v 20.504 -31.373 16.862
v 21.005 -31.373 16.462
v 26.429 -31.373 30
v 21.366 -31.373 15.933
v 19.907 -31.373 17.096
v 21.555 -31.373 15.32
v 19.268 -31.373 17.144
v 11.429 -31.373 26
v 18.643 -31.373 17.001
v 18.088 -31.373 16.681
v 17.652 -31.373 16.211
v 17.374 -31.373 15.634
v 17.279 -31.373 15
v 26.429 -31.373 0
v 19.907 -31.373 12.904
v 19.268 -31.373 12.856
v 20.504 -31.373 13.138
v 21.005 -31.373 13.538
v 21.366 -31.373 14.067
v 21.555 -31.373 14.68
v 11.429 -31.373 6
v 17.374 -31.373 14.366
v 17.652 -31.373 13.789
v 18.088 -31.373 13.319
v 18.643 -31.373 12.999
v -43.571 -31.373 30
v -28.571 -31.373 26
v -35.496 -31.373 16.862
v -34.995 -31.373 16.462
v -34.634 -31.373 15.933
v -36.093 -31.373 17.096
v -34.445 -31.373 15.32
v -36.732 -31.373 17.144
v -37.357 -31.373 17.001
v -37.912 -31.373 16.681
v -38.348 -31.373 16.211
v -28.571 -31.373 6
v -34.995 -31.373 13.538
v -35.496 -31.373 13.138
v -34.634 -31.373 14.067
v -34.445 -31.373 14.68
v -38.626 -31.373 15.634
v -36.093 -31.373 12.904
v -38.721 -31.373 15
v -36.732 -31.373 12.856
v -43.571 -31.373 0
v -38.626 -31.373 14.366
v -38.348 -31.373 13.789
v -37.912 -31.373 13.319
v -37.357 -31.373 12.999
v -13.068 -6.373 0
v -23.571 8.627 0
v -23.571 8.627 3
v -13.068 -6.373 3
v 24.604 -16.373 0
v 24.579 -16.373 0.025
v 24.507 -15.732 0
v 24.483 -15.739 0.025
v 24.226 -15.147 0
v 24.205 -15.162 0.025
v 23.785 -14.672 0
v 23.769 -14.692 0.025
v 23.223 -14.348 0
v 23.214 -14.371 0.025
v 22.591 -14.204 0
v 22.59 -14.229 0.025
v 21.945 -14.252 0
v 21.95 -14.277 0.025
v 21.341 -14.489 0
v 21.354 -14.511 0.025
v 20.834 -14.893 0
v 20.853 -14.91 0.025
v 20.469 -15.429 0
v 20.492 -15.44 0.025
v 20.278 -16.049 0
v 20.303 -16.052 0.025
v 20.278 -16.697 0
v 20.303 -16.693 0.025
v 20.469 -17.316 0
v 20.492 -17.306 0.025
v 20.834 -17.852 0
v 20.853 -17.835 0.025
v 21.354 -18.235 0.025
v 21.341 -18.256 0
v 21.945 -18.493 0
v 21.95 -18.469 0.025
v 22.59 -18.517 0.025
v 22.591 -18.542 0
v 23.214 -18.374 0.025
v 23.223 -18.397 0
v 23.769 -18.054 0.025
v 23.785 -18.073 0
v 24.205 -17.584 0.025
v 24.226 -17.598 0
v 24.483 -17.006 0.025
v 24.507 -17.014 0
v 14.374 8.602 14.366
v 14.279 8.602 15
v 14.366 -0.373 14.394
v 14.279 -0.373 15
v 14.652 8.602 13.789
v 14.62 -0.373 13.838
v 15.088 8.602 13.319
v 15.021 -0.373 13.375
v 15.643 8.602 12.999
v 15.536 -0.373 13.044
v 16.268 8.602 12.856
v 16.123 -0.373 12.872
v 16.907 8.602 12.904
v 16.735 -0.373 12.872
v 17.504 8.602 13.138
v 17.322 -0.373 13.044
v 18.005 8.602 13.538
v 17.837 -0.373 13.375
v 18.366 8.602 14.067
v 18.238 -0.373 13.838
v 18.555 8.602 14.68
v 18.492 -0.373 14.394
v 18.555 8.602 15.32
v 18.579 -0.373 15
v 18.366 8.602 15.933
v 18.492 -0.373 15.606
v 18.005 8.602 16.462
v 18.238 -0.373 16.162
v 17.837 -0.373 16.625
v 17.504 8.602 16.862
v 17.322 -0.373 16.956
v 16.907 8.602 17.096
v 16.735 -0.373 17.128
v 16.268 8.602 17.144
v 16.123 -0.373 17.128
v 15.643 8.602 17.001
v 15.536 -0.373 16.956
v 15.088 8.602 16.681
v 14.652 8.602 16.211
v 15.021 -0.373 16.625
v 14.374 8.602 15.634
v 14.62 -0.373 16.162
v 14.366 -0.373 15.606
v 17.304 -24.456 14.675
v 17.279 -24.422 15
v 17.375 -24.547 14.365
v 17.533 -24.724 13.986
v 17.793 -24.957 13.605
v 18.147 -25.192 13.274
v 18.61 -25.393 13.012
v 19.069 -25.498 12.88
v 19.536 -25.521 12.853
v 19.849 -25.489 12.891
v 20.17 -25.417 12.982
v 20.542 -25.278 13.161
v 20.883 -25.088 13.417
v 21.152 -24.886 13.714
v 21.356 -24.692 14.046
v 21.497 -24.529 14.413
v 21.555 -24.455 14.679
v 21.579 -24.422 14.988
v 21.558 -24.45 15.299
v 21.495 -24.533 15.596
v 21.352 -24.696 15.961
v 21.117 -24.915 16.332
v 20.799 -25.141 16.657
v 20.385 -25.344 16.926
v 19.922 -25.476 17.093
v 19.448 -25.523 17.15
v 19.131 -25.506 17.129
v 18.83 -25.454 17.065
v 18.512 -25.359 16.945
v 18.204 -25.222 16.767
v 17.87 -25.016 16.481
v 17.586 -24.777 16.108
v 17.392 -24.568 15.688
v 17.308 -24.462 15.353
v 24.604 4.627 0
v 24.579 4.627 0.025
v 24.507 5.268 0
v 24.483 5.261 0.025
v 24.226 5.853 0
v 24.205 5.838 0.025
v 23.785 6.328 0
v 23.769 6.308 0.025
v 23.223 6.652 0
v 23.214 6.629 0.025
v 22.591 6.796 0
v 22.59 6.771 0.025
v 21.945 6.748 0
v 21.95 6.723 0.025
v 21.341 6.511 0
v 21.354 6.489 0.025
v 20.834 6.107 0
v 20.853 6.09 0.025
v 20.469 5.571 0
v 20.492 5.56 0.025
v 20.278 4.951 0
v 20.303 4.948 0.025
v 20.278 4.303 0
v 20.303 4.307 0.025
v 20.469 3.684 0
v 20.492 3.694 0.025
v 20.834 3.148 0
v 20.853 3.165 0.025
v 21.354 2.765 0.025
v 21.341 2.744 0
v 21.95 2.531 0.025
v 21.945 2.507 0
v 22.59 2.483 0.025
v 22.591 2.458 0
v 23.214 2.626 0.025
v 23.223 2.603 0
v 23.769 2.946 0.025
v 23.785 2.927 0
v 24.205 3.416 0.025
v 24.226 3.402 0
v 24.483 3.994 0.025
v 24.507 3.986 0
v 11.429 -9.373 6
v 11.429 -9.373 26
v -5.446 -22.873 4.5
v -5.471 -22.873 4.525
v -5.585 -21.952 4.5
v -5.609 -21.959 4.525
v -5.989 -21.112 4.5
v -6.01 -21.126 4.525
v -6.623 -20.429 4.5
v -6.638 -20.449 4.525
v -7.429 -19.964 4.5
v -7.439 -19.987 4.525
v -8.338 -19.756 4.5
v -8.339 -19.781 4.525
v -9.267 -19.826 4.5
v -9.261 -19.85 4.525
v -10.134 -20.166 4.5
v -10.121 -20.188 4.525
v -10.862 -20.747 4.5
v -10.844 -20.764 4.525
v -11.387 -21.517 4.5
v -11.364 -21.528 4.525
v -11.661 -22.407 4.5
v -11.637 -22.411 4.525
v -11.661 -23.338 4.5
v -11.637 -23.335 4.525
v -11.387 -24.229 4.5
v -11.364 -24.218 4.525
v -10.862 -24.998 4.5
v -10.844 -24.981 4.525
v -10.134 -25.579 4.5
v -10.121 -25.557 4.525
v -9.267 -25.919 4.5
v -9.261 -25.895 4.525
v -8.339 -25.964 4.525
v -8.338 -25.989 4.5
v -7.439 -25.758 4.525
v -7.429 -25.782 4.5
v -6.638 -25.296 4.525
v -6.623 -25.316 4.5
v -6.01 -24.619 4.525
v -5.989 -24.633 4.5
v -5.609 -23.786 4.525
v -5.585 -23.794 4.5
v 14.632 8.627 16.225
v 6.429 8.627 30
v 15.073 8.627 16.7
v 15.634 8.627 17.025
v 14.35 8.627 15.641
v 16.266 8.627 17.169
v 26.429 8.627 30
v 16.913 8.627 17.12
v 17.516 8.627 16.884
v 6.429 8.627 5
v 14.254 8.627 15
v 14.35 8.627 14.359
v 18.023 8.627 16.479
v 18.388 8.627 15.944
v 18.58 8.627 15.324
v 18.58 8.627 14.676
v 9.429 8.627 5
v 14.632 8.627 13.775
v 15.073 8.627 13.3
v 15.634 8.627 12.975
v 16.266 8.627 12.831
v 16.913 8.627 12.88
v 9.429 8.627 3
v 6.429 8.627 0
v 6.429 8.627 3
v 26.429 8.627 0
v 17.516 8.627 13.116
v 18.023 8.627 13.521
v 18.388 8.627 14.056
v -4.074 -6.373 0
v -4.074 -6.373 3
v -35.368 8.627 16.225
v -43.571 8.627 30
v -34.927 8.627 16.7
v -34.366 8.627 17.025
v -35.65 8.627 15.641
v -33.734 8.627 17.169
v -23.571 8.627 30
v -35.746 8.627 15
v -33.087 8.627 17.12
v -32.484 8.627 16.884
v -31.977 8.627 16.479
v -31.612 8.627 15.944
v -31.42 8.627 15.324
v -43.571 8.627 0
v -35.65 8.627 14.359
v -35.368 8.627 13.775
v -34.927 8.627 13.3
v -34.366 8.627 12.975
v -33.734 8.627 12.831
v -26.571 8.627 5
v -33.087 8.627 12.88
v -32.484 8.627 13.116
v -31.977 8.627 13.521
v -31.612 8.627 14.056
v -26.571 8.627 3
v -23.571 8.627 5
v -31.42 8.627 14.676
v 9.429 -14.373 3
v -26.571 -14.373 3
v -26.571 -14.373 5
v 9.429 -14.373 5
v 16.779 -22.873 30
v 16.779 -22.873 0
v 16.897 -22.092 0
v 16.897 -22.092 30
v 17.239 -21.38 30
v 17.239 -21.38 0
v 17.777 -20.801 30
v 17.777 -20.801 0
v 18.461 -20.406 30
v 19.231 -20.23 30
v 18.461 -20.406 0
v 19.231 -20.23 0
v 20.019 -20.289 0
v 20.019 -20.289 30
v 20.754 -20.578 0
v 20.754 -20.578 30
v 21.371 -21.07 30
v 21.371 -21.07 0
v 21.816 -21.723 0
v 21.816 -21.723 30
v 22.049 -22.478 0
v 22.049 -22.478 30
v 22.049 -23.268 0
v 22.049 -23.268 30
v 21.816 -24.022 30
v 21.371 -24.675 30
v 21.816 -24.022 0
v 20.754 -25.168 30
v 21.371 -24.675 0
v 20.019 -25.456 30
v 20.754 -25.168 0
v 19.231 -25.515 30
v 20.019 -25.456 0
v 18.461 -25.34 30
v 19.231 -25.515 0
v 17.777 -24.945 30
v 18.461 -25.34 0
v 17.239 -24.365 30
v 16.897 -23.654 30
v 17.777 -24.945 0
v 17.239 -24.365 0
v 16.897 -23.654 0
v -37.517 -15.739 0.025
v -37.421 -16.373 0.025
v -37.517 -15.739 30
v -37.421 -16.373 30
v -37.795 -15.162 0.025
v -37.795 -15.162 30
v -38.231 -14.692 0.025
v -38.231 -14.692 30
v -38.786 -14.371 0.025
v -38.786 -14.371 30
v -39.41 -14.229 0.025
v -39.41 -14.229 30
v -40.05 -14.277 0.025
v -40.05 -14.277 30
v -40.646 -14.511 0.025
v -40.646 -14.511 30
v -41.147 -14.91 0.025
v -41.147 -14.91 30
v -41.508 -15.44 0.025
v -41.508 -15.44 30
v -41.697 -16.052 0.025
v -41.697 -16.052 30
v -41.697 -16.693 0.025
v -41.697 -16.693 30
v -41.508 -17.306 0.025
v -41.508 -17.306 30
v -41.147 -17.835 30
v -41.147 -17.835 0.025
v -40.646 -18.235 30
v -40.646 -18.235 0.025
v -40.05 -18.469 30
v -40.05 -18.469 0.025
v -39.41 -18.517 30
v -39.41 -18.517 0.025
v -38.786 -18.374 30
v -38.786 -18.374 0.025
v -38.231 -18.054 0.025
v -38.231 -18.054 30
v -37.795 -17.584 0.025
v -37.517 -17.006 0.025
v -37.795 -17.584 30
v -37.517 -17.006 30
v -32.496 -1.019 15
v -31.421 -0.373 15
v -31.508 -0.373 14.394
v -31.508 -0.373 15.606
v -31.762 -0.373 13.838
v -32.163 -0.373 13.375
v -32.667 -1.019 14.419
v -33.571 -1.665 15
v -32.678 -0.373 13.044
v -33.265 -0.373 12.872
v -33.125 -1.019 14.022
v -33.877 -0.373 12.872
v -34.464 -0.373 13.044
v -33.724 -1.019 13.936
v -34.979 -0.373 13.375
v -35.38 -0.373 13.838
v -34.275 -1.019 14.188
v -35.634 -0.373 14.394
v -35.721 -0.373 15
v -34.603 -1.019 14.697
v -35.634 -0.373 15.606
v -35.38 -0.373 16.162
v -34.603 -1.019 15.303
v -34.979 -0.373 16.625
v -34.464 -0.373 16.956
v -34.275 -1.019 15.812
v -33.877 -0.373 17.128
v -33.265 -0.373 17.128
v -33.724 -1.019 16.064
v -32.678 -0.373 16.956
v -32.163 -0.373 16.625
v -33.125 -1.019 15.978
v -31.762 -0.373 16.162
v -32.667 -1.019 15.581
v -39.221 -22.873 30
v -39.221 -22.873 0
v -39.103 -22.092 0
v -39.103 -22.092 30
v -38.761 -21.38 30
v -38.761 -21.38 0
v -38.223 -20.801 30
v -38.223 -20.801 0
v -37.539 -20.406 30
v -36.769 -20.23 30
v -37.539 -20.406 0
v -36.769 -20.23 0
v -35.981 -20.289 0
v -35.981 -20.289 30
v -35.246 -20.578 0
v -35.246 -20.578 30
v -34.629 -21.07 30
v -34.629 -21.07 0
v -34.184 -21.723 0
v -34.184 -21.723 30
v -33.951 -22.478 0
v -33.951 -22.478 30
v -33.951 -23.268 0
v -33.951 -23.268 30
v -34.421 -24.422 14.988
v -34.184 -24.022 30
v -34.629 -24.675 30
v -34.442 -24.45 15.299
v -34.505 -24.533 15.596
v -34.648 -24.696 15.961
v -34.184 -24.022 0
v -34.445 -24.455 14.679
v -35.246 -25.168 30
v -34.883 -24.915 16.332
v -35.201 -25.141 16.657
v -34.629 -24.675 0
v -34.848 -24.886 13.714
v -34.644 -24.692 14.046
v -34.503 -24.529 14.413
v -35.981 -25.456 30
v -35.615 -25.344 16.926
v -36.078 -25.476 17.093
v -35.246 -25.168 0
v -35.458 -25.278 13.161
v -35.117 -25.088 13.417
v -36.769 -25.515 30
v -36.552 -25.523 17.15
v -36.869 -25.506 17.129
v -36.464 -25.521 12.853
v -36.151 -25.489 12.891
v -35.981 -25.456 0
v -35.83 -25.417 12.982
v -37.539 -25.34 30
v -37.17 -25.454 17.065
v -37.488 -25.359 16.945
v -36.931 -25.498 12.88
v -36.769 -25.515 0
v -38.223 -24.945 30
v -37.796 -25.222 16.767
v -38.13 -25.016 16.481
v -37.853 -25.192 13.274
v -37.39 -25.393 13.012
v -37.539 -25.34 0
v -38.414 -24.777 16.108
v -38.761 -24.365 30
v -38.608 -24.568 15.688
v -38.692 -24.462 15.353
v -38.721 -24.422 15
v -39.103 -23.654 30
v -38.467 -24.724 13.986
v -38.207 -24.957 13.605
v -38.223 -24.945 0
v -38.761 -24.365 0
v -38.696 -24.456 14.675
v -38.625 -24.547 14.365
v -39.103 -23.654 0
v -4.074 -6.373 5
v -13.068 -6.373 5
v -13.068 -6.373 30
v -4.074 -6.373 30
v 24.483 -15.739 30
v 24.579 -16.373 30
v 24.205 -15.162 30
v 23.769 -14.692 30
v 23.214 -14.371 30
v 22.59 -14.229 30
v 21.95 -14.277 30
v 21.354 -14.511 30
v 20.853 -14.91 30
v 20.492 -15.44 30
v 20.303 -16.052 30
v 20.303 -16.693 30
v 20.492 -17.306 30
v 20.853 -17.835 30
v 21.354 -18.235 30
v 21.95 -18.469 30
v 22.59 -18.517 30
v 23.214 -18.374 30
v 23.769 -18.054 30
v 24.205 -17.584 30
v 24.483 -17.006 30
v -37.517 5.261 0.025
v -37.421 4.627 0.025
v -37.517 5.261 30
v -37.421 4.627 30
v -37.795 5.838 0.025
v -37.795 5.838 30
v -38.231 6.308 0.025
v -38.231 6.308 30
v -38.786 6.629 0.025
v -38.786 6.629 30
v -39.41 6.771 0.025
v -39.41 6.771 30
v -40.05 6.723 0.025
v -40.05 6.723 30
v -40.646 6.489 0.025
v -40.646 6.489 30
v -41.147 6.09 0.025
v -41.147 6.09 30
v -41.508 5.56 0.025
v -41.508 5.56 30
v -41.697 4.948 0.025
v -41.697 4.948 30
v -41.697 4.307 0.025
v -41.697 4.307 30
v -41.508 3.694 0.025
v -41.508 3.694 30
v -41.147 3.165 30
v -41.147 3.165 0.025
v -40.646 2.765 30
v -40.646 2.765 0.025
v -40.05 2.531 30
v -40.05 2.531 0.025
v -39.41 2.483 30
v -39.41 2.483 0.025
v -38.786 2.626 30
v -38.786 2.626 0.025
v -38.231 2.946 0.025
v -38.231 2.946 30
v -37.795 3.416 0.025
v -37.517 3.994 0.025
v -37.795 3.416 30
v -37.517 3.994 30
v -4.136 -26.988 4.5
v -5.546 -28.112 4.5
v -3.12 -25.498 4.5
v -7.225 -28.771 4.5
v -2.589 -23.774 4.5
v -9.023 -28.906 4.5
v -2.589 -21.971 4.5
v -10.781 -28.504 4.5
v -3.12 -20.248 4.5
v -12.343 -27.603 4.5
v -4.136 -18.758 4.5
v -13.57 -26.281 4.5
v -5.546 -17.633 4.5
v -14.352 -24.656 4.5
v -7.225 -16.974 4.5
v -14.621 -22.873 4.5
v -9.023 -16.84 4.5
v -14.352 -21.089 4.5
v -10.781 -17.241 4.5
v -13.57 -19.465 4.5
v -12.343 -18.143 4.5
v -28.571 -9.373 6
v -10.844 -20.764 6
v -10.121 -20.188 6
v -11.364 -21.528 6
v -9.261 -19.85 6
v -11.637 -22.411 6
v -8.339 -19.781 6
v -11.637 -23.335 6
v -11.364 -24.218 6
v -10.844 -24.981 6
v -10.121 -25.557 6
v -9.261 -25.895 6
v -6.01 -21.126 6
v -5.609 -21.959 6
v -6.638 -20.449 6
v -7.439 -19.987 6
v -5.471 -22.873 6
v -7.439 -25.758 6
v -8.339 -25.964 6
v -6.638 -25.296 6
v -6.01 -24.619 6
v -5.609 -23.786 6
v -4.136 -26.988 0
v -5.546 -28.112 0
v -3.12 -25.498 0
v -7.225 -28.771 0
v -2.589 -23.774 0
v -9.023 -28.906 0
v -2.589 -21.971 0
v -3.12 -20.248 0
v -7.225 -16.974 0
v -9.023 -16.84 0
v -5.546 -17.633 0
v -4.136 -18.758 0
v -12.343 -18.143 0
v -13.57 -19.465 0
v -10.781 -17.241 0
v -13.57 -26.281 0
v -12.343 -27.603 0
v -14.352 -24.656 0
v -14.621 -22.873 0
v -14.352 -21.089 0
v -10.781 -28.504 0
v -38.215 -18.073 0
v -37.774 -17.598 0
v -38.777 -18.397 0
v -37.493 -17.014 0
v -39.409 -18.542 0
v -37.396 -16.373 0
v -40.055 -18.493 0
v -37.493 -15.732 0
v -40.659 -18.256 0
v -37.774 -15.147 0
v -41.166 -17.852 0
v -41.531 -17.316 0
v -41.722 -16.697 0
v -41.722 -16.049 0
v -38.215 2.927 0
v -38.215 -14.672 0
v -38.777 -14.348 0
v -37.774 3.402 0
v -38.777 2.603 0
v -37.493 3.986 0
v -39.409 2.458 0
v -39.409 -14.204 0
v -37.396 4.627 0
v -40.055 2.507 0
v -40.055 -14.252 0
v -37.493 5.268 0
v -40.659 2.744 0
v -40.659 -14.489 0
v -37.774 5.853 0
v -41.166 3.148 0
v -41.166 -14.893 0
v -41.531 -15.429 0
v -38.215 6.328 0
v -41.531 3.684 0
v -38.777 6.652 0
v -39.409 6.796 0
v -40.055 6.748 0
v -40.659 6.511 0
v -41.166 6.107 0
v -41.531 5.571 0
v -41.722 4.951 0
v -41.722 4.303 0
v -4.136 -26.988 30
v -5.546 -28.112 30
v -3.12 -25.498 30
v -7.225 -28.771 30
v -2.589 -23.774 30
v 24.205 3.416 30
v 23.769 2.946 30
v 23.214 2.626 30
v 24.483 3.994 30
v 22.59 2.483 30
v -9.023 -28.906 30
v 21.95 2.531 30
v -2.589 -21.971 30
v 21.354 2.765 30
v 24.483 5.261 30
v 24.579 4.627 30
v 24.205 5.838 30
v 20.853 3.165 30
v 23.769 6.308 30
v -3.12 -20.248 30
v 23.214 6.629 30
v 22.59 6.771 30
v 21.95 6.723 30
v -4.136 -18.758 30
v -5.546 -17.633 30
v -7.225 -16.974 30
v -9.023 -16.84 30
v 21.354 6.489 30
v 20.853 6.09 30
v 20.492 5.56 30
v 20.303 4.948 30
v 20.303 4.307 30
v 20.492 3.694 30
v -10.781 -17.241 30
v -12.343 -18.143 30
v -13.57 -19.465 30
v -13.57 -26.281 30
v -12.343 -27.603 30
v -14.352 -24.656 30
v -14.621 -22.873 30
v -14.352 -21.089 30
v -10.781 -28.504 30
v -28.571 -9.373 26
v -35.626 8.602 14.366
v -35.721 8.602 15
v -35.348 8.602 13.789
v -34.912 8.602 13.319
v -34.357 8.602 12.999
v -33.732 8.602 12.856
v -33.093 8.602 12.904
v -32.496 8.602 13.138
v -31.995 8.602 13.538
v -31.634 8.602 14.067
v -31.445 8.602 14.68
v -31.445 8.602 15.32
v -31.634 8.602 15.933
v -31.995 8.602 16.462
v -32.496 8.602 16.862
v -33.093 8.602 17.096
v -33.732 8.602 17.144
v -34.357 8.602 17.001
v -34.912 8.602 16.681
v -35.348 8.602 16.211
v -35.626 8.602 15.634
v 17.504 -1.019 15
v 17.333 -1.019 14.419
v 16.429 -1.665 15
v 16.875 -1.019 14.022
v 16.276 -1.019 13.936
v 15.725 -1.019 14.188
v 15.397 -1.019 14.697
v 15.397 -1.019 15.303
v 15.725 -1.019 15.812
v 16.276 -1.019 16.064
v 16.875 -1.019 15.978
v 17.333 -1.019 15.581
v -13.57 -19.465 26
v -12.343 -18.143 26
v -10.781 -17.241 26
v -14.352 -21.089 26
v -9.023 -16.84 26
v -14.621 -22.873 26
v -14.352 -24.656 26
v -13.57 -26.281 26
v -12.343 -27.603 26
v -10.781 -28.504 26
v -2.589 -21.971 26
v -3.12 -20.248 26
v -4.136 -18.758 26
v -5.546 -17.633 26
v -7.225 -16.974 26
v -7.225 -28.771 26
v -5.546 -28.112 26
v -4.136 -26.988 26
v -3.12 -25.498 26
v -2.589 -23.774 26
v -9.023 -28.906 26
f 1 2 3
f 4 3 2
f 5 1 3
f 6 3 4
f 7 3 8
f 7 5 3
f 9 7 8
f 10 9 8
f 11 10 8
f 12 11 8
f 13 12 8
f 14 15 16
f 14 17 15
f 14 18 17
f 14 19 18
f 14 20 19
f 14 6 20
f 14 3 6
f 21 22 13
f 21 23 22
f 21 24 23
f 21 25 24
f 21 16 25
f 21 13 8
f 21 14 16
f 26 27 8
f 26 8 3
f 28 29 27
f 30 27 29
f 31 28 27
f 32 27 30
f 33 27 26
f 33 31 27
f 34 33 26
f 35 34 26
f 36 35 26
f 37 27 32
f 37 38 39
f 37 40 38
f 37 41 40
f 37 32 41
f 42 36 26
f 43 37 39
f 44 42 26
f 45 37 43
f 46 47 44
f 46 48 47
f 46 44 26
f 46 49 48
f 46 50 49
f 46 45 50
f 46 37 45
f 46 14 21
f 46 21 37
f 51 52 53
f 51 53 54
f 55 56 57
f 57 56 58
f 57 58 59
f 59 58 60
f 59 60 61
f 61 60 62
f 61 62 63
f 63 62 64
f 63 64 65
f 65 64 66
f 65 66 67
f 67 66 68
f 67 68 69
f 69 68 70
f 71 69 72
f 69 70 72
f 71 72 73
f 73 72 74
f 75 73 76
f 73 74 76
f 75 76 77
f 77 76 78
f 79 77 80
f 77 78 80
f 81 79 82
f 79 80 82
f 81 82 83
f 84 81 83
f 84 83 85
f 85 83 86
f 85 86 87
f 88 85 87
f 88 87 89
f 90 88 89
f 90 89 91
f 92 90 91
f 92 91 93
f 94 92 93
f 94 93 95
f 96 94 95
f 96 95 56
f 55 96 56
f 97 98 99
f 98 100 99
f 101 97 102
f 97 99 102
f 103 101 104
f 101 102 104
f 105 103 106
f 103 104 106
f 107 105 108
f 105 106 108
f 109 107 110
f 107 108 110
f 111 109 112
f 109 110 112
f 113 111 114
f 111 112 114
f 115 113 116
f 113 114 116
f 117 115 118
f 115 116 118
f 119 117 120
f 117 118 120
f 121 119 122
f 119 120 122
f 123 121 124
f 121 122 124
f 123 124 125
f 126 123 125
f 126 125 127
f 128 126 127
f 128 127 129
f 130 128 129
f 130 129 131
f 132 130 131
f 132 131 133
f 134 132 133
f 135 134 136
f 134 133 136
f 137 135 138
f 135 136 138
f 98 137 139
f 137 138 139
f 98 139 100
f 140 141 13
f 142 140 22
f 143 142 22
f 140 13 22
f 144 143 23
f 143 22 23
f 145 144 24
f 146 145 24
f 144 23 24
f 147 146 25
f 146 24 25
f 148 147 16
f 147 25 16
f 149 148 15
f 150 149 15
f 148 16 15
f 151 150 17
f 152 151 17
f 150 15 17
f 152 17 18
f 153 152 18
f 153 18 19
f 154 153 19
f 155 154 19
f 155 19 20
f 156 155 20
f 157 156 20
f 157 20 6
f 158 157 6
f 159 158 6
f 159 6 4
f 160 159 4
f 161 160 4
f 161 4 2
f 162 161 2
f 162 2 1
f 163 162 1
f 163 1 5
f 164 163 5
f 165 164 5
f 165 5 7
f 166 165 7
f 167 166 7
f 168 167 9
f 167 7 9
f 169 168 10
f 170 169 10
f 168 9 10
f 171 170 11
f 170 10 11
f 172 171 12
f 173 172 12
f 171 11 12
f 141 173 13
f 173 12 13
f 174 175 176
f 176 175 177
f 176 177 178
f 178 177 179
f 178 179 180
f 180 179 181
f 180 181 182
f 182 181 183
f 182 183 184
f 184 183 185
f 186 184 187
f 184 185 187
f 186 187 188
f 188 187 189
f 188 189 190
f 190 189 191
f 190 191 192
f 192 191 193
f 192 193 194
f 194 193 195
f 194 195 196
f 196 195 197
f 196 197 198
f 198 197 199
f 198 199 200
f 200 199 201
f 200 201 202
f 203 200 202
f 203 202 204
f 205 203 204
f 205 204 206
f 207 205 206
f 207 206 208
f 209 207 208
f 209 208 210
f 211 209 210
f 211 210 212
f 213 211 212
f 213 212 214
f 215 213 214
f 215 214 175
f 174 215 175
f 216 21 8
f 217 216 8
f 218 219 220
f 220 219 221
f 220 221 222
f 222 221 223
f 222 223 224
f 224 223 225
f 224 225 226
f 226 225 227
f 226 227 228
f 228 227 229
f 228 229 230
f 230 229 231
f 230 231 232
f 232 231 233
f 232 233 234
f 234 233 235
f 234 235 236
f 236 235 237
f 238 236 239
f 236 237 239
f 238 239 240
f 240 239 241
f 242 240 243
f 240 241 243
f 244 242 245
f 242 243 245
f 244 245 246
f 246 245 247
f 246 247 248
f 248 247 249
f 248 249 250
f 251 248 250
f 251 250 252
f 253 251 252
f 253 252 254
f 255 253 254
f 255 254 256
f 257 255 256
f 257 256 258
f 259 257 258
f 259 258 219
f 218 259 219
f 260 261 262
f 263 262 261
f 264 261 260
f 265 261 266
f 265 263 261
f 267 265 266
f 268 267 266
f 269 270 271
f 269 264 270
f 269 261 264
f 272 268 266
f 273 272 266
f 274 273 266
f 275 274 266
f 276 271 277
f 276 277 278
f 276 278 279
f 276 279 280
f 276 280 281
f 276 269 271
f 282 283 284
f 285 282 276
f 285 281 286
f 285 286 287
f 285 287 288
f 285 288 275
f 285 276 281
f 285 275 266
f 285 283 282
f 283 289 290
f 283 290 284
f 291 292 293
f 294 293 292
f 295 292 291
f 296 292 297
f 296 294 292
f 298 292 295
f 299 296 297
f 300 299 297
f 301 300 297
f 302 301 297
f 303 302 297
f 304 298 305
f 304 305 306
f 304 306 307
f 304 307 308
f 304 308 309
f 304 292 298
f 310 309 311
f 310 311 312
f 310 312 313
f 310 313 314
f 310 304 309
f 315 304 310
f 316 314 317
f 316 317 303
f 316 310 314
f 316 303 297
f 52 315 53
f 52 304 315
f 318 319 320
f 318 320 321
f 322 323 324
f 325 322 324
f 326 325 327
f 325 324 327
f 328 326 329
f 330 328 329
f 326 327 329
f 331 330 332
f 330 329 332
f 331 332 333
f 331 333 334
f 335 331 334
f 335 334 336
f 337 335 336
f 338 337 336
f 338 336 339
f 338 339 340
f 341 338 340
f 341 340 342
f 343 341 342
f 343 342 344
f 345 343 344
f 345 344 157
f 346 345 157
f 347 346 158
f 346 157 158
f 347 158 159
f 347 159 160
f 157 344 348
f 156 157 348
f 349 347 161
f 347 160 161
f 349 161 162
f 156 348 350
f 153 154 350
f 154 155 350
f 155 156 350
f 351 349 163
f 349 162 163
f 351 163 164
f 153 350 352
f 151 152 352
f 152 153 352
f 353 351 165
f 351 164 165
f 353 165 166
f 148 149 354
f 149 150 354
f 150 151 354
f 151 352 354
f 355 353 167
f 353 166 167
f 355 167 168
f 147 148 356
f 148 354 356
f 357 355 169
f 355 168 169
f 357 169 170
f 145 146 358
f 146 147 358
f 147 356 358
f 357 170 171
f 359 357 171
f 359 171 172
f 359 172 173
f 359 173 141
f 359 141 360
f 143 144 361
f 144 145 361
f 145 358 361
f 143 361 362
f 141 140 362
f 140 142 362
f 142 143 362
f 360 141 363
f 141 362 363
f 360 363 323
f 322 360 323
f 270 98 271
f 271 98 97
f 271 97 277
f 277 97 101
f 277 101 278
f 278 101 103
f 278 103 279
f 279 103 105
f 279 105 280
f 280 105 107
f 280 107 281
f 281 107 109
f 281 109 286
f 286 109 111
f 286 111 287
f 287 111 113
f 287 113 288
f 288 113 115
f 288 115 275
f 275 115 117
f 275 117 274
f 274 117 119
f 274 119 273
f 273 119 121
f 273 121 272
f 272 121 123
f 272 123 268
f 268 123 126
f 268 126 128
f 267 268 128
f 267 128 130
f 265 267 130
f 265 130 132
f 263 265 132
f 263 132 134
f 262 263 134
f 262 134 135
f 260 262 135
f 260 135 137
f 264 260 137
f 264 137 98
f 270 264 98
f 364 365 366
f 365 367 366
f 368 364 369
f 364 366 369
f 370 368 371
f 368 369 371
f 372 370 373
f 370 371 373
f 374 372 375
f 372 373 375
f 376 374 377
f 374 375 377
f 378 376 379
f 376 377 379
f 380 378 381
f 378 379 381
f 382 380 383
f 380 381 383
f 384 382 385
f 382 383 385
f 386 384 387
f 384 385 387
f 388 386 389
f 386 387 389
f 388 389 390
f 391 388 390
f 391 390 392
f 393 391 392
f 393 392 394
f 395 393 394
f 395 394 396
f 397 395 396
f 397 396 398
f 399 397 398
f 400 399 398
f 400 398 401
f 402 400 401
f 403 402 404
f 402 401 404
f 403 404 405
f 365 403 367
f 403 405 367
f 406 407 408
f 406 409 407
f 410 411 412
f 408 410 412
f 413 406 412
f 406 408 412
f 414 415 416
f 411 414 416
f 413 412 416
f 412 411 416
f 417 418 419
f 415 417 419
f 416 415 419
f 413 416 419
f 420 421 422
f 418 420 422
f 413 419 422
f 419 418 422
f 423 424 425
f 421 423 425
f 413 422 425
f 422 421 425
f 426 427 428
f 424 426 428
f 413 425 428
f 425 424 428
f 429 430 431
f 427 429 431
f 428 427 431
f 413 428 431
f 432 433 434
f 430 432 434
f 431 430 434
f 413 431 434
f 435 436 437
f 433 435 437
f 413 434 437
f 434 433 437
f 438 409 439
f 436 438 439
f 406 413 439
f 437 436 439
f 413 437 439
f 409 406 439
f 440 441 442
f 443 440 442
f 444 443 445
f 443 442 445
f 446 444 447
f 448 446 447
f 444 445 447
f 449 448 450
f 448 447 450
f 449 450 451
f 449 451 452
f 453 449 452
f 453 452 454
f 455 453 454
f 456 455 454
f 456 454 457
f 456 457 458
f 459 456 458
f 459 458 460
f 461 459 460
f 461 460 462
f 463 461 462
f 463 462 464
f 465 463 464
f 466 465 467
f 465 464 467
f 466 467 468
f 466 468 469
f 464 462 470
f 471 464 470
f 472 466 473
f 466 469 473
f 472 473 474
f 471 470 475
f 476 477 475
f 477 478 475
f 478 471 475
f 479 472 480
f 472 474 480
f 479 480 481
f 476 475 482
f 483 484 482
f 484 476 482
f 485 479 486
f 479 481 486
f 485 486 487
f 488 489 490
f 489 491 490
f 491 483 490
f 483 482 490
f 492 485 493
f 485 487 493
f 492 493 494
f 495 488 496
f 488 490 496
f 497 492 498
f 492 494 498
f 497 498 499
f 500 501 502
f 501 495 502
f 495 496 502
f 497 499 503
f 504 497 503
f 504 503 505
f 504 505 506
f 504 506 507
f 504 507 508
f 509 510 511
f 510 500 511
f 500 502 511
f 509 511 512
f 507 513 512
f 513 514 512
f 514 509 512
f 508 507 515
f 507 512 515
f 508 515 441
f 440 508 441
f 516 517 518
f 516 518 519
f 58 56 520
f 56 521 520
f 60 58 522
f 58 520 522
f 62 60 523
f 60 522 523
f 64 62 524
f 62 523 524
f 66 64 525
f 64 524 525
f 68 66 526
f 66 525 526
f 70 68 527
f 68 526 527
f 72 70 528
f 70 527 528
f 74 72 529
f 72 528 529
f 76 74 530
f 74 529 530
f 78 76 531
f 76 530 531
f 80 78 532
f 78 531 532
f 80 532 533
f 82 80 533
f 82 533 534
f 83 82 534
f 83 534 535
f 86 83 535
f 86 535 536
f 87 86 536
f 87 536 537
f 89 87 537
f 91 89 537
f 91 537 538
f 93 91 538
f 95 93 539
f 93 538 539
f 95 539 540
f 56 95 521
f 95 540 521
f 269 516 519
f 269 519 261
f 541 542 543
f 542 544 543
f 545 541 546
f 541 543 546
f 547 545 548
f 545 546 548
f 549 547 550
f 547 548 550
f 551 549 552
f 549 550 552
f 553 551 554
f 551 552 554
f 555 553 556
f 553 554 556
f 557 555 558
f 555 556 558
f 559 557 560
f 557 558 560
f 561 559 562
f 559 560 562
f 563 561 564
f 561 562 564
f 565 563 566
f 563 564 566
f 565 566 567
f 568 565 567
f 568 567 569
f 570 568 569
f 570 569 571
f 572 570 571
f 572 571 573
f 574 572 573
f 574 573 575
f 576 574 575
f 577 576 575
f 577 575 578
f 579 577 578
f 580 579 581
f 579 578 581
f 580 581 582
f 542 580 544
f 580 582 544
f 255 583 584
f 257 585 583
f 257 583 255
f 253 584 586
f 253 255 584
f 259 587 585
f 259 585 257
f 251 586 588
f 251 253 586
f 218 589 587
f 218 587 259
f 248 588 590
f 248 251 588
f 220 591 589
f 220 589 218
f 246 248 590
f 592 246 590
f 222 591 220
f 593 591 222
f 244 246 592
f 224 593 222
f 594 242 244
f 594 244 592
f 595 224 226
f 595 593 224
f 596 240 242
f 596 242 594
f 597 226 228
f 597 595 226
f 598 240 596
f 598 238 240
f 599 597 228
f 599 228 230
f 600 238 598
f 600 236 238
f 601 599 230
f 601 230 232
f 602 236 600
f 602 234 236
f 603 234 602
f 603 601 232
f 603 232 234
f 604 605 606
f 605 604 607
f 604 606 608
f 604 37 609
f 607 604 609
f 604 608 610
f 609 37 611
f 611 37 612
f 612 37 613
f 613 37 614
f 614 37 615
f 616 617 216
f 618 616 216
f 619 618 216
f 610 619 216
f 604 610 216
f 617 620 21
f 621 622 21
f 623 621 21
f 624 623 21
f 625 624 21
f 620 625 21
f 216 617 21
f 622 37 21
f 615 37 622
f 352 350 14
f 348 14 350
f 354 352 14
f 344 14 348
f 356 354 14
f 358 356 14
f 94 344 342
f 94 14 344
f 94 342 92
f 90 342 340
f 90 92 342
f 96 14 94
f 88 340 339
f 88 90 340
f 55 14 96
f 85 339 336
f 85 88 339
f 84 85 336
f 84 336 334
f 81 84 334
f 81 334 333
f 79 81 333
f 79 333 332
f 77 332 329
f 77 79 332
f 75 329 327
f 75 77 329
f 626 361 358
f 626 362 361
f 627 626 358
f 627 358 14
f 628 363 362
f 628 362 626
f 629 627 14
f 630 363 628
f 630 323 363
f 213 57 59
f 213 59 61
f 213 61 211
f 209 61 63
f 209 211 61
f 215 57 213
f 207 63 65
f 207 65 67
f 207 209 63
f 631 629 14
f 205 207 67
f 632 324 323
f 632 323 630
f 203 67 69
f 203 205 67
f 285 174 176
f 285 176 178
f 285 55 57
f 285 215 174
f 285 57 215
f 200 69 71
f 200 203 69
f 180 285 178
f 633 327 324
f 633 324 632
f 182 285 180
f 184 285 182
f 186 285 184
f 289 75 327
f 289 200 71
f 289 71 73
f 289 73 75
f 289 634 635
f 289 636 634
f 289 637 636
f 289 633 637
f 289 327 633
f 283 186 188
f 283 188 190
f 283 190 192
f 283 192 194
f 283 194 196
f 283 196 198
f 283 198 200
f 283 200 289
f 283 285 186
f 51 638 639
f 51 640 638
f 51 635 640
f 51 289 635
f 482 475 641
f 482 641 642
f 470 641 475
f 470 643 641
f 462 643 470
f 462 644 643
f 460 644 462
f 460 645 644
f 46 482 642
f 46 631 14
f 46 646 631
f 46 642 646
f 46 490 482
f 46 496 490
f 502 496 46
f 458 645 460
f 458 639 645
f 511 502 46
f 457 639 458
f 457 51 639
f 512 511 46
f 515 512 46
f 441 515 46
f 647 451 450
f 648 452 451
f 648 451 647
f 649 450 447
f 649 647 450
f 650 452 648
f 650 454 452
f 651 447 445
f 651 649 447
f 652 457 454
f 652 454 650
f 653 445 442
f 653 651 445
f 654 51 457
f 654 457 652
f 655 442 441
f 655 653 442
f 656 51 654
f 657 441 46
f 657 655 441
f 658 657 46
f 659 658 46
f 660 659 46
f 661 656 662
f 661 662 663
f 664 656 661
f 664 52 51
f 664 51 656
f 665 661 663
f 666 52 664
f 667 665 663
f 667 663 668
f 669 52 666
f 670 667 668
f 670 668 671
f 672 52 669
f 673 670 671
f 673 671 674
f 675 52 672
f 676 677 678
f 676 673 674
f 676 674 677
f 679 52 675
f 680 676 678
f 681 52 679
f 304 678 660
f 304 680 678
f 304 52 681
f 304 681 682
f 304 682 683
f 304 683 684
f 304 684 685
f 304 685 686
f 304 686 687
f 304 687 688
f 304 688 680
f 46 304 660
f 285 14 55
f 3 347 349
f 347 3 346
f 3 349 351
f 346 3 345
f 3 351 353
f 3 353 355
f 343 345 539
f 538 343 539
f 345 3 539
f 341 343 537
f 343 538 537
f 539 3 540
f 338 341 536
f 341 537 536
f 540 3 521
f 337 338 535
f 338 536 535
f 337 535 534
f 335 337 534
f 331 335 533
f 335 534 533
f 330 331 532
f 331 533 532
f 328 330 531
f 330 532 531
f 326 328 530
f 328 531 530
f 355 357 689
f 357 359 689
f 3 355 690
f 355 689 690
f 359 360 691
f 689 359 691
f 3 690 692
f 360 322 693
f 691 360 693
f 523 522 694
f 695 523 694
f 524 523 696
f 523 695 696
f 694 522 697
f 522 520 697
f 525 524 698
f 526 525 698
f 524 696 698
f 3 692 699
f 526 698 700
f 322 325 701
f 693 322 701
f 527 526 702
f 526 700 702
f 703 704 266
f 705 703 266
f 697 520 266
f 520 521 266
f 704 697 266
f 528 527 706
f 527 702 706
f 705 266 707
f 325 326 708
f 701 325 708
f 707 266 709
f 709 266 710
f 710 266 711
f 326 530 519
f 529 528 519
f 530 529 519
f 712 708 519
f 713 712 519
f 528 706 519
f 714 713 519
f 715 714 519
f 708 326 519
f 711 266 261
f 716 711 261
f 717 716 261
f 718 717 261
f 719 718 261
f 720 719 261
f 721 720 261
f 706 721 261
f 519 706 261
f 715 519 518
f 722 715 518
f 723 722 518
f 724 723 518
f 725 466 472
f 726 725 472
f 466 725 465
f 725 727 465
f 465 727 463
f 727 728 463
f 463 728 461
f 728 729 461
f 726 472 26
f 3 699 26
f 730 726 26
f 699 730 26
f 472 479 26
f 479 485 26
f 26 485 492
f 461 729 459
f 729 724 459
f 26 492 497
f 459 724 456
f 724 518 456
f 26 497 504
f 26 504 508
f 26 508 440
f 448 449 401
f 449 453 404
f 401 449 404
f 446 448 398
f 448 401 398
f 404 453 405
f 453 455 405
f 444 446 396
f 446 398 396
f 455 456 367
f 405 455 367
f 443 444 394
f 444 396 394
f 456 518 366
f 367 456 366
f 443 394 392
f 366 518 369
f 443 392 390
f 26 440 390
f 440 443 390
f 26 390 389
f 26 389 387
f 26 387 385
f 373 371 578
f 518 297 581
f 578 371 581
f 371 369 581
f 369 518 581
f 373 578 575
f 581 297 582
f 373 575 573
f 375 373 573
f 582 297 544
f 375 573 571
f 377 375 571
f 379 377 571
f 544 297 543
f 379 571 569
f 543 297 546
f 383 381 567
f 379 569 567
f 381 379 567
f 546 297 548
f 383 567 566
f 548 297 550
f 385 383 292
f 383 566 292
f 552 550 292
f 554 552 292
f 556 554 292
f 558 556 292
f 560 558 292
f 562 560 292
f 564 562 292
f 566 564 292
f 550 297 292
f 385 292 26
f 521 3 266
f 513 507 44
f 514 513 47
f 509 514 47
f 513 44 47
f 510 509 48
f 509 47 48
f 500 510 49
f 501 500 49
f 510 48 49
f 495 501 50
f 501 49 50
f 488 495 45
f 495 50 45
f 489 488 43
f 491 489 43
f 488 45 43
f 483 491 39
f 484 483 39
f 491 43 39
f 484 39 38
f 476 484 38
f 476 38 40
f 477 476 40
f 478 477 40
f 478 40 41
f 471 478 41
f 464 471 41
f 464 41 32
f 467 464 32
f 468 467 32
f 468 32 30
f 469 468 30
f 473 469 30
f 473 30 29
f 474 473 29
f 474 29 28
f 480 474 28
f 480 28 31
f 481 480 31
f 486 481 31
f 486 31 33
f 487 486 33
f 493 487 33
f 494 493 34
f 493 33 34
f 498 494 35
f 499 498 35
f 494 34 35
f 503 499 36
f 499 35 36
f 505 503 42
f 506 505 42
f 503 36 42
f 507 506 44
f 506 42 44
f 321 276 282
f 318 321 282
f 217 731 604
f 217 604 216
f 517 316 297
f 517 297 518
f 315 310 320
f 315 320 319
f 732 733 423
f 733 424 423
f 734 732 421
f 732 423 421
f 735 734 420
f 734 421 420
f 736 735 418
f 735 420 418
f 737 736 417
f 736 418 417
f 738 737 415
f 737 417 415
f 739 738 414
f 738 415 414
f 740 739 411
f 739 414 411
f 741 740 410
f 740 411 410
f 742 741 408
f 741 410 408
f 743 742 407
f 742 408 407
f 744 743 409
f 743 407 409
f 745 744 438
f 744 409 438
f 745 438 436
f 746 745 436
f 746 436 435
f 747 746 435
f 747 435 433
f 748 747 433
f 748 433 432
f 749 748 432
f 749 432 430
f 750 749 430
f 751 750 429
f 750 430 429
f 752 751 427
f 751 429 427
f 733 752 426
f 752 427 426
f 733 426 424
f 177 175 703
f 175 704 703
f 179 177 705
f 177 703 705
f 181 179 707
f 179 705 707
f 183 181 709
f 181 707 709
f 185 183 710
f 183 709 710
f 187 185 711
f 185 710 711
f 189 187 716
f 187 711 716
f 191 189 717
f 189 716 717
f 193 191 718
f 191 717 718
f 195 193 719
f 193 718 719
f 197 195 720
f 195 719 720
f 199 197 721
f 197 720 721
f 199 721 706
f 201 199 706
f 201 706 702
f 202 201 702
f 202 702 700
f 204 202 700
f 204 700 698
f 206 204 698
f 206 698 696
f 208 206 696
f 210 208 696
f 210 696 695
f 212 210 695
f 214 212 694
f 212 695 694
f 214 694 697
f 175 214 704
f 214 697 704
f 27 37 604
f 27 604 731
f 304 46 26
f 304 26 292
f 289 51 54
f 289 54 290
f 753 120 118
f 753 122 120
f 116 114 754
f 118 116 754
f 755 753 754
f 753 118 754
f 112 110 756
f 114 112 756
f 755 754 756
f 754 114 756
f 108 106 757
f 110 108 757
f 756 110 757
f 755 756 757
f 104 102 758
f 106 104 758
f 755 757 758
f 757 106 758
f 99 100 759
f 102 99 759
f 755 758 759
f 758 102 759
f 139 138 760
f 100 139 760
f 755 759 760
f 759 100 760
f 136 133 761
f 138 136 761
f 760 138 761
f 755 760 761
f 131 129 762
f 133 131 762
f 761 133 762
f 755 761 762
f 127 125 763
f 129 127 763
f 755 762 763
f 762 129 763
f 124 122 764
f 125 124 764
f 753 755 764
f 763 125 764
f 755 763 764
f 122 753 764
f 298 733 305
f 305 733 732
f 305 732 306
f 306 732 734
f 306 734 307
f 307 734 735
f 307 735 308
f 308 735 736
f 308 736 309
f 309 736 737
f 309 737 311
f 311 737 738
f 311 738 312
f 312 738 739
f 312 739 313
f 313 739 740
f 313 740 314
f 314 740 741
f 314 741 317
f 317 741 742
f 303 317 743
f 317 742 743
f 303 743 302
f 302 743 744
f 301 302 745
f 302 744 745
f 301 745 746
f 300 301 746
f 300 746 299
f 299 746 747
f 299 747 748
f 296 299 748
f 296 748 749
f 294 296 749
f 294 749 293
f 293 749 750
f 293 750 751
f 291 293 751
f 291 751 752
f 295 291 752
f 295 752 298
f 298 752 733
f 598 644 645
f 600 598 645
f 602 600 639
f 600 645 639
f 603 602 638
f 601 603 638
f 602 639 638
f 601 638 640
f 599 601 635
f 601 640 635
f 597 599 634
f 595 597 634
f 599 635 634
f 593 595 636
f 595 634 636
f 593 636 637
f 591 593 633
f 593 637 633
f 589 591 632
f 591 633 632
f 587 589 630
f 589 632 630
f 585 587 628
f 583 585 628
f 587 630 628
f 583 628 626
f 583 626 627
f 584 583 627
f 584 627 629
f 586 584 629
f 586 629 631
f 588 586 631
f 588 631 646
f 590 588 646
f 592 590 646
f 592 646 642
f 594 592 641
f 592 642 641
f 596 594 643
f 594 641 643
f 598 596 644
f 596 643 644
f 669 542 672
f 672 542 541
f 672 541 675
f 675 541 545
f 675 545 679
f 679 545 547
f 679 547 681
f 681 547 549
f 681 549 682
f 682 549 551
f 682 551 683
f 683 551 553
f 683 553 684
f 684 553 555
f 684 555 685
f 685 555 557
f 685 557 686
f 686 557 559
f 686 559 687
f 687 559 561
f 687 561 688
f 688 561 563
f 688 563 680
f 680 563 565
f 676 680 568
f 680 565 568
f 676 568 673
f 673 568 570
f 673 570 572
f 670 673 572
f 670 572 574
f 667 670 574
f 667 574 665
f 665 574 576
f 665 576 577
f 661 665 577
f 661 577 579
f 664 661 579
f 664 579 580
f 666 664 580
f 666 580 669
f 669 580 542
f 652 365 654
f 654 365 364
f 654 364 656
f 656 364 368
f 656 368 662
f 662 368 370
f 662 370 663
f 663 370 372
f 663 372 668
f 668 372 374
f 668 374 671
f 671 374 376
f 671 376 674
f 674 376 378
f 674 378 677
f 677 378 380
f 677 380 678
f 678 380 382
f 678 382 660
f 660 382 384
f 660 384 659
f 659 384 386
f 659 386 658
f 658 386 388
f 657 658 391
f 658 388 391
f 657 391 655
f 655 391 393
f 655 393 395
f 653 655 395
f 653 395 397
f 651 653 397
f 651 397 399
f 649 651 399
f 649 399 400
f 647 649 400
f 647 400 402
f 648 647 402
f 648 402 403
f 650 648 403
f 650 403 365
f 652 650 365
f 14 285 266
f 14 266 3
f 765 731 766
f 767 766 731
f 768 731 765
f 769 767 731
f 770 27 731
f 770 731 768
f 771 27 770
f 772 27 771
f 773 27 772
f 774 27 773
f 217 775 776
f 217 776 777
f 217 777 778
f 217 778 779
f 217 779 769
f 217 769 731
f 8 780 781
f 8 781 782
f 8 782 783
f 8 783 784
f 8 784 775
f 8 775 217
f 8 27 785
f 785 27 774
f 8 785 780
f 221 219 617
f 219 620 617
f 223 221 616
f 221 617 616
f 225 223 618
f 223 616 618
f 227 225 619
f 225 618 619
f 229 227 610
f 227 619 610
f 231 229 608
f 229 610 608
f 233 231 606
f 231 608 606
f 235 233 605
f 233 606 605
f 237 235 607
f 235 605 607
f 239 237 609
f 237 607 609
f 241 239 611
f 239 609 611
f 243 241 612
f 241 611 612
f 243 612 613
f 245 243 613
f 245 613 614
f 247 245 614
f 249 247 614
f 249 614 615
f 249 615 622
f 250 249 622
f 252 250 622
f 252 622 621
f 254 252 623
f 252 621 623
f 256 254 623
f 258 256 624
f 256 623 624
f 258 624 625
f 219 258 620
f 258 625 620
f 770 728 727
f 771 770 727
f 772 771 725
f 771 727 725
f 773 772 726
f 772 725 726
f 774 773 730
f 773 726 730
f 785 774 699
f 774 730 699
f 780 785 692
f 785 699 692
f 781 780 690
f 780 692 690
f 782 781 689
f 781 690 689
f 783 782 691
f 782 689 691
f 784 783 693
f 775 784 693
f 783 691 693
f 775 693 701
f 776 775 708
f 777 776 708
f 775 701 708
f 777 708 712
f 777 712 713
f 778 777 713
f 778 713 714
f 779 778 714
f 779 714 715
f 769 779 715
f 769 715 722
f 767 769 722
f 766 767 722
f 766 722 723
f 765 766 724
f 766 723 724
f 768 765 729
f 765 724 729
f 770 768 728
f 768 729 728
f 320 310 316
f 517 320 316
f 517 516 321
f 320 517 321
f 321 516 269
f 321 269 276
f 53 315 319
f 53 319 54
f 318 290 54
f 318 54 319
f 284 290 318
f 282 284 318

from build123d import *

# Parameters (mm, degrees)
AUFSATZ_LINEAR_AUSTRAGEN1_DEPTH            = 30
DURCHGANGSLOCH_F_R_M51_D                   = 5.3
DURCHGANGSLOCH_F_R_M43_REACH               = 68.321
DURCHGANGSLOCH_F_R_M43_BORE_R              = 2.15
DURCHGANGSLOCH_F_R_M41_D                   = 4.3
DURCHGANGSLOCH_F_R_M41_CSINK_D             = 4.35
DURCHGANGSLOCH_F_R_M41_CSINK_ANGLE         = 90
SKIZZE21_W                                 = 40
SKIZZE21_H                                 = 20
SCHNITT_LINEAR_AUSTRAGEN5_DEPTH            = 22
SKIZZE22_R                                 = 6.05
SCHNITT_LINEAR_AUSTRAGEN6_DEPTH            = 4.5
F_6_2_6_2_DURCHMESSER_BOHRUNG1_D           = 6.2
F_6_2_6_2_DURCHMESSER_BOHRUNG1_CSINK_D     = 6.25
F_6_2_6_2_DURCHMESSER_BOHRUNG1_CSINK_ANGLE = 90
SKIZZE25_R                                 = 6.05
SCHNITT_LINEAR_AUSTRAGEN7_DEPTH            = 4
DURCHGANGSLOCH_F_R_M42_D                   = 4.3
DURCHGANGSLOCH_F_R_M42_DEPTH               = 9
DURCHGANGSLOCH_F_R_M42_CSINK_D             = 4.35
DURCHGANGSLOCH_F_R_M42_CSINK_ANGLE         = 90
DURCHGANGSLOCH_F_R_M42_TIP                 = 1.291850331
SKIZZE30_W                                 = 36
SKIZZE30_H                                 = 2
SCHNITT_LINEAR_AUSTRAGEN8_DEPTH            = 23


with BuildPart() as part:
    # Skizze1 → Aufsatz-Linear austragen1 (new body)
    with BuildSketch(Plane.XY):
        Polygon((26.428839574, -31.372693626), (-43.571160426, -31.372693626), (-43.571160426, 8.627306374), (-23.571160426, 8.627306374), (-13.068047352, -6.372693626), (-4.074273499, -6.372693626), (6.428839574, 8.627306374), (26.428839574, 8.627306374), align=None)
    extrude(amount=AUFSATZ_LINEAR_AUSTRAGEN1_DEPTH)

    # Durchgangsloch für M51 (through all)
    with Locations(Plane.XY.offset(30)):
        with Locations((-36.571160426, -22.872693626), (19.428839574, -22.872693626)):
            Hole(DURCHGANGSLOCH_F_R_M51_D / 2)

    # Durchgangsloch für M43 bore → Durchgangsloch für M43 (cut, up to next)
    with BuildSketch(Plane(origin=(0, -31.372693626, 0), x_dir=(-1, 0, 0), z_dir=(0, -1, 0)), mode=Mode.PRIVATE) as durchgangsloch_f_r_m43_sk1:
        with Locations((36.571160426, -15)):
            Circle(DURCHGANGSLOCH_F_R_M43_BORE_R)
    durchgangsloch_f_r_m43_tool1 = extrude(durchgangsloch_f_r_m43_sk1.sketch, amount=-DURCHGANGSLOCH_F_R_M43_REACH, mode=Mode.PRIVATE) & part.part
    # Durchgangsloch für M43 bore → Durchgangsloch für M43 (cut, up to next)
    with BuildSketch(Plane(origin=(0, -31.372693626, 0), x_dir=(-1, 0, 0), z_dir=(0, -1, 0)), mode=Mode.PRIVATE) as durchgangsloch_f_r_m43_sk2:
        with Locations((-19.428839574, -15)):
            Circle(DURCHGANGSLOCH_F_R_M43_BORE_R)
    durchgangsloch_f_r_m43_tool2 = extrude(durchgangsloch_f_r_m43_sk2.sketch, amount=-DURCHGANGSLOCH_F_R_M43_REACH, mode=Mode.PRIVATE) & part.part
    add(durchgangsloch_f_r_m43_tool1.solids().sort_by_distance((-36.57116, -31.372694, 15))[0], mode=Mode.SUBTRACT)
    add(durchgangsloch_f_r_m43_tool2.solids().sort_by_distance((19.42884, -31.372694, 15))[0], mode=Mode.SUBTRACT)

    # Durchgangsloch für M41 (through all)
    with Locations(Plane(origin=(0, 0, 0), x_dir=(-1, 0, 0), z_dir=(0, 0, -1))):
        with Locations((-22.428839574, 4.627306374), (-22.428839574, -16.372693626), (39.571160426, -16.372693626), (39.571160426, 4.627306374)):
            CounterSinkHole(DURCHGANGSLOCH_F_R_M41_D / 2, DURCHGANGSLOCH_F_R_M41_CSINK_D / 2, counter_sink_angle=DURCHGANGSLOCH_F_R_M41_CSINK_ANGLE)

    # Skizze21 → Schnitt-Linear austragen5 (cut)
    with BuildSketch(Plane.XZ.offset(31.372693626)):
        with Locations((-8.571160426, 16)):
            Rectangle(SKIZZE21_W, SKIZZE21_H)
    extrude(amount=-SCHNITT_LINEAR_AUSTRAGEN5_DEPTH, mode=Mode.SUBTRACT)

    # Skizze22 → Schnitt-Linear austragen6 (cut)
    with BuildSketch(Plane(origin=(0, 0, 0), x_dir=(-1, 0, 0), z_dir=(0, 0, -1))):
        with Locations((8.571160426, -22.872693626)):
            Circle(SKIZZE22_R)
    extrude(amount=-SCHNITT_LINEAR_AUSTRAGEN6_DEPTH, mode=Mode.SUBTRACT)

    # Ø6.2 (6.2) Durchmesser Bohrung1 (through all)
    with Locations(Plane(origin=(0, 0, 4.5), x_dir=(-1, 0, 0), z_dir=(0, 0, -1))):
        with Locations((8.571160426, -22.872693626)):
            CounterSinkHole(F_6_2_6_2_DURCHMESSER_BOHRUNG1_D / 2, F_6_2_6_2_DURCHMESSER_BOHRUNG1_CSINK_D / 2, counter_sink_angle=F_6_2_6_2_DURCHMESSER_BOHRUNG1_CSINK_ANGLE)

    # Skizze25 → Schnitt-Linear austragen7 (cut)
    with BuildSketch(Plane.XY.offset(30)):
        with Locations(Location((-8.571160426, -22.872693626, 0), (0, 0, 180))):
            Circle(SKIZZE25_R)
    extrude(amount=-SCHNITT_LINEAR_AUSTRAGEN7_DEPTH, mode=Mode.SUBTRACT)

    # Durchgangsloch für M42
    with Locations(Plane(origin=(0, 8.627306374, 0), x_dir=(1, 0, 0), z_dir=(0, 1, 0))):
        with Locations((-33.571160426, -15), (16.428839574, -15)):
            CounterSinkHole(DURCHGANGSLOCH_F_R_M42_D / 2, DURCHGANGSLOCH_F_R_M42_CSINK_D / 2, depth=DURCHGANGSLOCH_F_R_M42_DEPTH, counter_sink_angle=DURCHGANGSLOCH_F_R_M42_CSINK_ANGLE)
            with Locations((0, 0, -(DURCHGANGSLOCH_F_R_M42_DEPTH + DURCHGANGSLOCH_F_R_M42_TIP / 2))):  # 118° drill point
                Cone(0, DURCHGANGSLOCH_F_R_M42_D / 2, DURCHGANGSLOCH_F_R_M42_TIP, mode=Mode.SUBTRACT)

    # Skizze30 → Schnitt-Linear austragen8 (cut)
    with BuildSketch(Plane(origin=(0, 8.627306374, 0), x_dir=(1, 0, 0), z_dir=(0, 1, 0))):
        with Locations((-8.571160426, -4)):
            Rectangle(SKIZZE30_W, SKIZZE30_H)
    extrude(amount=-SCHNITT_LINEAR_AUSTRAGEN8_DEPTH, mode=Mode.SUBTRACT)


solid = part.part
